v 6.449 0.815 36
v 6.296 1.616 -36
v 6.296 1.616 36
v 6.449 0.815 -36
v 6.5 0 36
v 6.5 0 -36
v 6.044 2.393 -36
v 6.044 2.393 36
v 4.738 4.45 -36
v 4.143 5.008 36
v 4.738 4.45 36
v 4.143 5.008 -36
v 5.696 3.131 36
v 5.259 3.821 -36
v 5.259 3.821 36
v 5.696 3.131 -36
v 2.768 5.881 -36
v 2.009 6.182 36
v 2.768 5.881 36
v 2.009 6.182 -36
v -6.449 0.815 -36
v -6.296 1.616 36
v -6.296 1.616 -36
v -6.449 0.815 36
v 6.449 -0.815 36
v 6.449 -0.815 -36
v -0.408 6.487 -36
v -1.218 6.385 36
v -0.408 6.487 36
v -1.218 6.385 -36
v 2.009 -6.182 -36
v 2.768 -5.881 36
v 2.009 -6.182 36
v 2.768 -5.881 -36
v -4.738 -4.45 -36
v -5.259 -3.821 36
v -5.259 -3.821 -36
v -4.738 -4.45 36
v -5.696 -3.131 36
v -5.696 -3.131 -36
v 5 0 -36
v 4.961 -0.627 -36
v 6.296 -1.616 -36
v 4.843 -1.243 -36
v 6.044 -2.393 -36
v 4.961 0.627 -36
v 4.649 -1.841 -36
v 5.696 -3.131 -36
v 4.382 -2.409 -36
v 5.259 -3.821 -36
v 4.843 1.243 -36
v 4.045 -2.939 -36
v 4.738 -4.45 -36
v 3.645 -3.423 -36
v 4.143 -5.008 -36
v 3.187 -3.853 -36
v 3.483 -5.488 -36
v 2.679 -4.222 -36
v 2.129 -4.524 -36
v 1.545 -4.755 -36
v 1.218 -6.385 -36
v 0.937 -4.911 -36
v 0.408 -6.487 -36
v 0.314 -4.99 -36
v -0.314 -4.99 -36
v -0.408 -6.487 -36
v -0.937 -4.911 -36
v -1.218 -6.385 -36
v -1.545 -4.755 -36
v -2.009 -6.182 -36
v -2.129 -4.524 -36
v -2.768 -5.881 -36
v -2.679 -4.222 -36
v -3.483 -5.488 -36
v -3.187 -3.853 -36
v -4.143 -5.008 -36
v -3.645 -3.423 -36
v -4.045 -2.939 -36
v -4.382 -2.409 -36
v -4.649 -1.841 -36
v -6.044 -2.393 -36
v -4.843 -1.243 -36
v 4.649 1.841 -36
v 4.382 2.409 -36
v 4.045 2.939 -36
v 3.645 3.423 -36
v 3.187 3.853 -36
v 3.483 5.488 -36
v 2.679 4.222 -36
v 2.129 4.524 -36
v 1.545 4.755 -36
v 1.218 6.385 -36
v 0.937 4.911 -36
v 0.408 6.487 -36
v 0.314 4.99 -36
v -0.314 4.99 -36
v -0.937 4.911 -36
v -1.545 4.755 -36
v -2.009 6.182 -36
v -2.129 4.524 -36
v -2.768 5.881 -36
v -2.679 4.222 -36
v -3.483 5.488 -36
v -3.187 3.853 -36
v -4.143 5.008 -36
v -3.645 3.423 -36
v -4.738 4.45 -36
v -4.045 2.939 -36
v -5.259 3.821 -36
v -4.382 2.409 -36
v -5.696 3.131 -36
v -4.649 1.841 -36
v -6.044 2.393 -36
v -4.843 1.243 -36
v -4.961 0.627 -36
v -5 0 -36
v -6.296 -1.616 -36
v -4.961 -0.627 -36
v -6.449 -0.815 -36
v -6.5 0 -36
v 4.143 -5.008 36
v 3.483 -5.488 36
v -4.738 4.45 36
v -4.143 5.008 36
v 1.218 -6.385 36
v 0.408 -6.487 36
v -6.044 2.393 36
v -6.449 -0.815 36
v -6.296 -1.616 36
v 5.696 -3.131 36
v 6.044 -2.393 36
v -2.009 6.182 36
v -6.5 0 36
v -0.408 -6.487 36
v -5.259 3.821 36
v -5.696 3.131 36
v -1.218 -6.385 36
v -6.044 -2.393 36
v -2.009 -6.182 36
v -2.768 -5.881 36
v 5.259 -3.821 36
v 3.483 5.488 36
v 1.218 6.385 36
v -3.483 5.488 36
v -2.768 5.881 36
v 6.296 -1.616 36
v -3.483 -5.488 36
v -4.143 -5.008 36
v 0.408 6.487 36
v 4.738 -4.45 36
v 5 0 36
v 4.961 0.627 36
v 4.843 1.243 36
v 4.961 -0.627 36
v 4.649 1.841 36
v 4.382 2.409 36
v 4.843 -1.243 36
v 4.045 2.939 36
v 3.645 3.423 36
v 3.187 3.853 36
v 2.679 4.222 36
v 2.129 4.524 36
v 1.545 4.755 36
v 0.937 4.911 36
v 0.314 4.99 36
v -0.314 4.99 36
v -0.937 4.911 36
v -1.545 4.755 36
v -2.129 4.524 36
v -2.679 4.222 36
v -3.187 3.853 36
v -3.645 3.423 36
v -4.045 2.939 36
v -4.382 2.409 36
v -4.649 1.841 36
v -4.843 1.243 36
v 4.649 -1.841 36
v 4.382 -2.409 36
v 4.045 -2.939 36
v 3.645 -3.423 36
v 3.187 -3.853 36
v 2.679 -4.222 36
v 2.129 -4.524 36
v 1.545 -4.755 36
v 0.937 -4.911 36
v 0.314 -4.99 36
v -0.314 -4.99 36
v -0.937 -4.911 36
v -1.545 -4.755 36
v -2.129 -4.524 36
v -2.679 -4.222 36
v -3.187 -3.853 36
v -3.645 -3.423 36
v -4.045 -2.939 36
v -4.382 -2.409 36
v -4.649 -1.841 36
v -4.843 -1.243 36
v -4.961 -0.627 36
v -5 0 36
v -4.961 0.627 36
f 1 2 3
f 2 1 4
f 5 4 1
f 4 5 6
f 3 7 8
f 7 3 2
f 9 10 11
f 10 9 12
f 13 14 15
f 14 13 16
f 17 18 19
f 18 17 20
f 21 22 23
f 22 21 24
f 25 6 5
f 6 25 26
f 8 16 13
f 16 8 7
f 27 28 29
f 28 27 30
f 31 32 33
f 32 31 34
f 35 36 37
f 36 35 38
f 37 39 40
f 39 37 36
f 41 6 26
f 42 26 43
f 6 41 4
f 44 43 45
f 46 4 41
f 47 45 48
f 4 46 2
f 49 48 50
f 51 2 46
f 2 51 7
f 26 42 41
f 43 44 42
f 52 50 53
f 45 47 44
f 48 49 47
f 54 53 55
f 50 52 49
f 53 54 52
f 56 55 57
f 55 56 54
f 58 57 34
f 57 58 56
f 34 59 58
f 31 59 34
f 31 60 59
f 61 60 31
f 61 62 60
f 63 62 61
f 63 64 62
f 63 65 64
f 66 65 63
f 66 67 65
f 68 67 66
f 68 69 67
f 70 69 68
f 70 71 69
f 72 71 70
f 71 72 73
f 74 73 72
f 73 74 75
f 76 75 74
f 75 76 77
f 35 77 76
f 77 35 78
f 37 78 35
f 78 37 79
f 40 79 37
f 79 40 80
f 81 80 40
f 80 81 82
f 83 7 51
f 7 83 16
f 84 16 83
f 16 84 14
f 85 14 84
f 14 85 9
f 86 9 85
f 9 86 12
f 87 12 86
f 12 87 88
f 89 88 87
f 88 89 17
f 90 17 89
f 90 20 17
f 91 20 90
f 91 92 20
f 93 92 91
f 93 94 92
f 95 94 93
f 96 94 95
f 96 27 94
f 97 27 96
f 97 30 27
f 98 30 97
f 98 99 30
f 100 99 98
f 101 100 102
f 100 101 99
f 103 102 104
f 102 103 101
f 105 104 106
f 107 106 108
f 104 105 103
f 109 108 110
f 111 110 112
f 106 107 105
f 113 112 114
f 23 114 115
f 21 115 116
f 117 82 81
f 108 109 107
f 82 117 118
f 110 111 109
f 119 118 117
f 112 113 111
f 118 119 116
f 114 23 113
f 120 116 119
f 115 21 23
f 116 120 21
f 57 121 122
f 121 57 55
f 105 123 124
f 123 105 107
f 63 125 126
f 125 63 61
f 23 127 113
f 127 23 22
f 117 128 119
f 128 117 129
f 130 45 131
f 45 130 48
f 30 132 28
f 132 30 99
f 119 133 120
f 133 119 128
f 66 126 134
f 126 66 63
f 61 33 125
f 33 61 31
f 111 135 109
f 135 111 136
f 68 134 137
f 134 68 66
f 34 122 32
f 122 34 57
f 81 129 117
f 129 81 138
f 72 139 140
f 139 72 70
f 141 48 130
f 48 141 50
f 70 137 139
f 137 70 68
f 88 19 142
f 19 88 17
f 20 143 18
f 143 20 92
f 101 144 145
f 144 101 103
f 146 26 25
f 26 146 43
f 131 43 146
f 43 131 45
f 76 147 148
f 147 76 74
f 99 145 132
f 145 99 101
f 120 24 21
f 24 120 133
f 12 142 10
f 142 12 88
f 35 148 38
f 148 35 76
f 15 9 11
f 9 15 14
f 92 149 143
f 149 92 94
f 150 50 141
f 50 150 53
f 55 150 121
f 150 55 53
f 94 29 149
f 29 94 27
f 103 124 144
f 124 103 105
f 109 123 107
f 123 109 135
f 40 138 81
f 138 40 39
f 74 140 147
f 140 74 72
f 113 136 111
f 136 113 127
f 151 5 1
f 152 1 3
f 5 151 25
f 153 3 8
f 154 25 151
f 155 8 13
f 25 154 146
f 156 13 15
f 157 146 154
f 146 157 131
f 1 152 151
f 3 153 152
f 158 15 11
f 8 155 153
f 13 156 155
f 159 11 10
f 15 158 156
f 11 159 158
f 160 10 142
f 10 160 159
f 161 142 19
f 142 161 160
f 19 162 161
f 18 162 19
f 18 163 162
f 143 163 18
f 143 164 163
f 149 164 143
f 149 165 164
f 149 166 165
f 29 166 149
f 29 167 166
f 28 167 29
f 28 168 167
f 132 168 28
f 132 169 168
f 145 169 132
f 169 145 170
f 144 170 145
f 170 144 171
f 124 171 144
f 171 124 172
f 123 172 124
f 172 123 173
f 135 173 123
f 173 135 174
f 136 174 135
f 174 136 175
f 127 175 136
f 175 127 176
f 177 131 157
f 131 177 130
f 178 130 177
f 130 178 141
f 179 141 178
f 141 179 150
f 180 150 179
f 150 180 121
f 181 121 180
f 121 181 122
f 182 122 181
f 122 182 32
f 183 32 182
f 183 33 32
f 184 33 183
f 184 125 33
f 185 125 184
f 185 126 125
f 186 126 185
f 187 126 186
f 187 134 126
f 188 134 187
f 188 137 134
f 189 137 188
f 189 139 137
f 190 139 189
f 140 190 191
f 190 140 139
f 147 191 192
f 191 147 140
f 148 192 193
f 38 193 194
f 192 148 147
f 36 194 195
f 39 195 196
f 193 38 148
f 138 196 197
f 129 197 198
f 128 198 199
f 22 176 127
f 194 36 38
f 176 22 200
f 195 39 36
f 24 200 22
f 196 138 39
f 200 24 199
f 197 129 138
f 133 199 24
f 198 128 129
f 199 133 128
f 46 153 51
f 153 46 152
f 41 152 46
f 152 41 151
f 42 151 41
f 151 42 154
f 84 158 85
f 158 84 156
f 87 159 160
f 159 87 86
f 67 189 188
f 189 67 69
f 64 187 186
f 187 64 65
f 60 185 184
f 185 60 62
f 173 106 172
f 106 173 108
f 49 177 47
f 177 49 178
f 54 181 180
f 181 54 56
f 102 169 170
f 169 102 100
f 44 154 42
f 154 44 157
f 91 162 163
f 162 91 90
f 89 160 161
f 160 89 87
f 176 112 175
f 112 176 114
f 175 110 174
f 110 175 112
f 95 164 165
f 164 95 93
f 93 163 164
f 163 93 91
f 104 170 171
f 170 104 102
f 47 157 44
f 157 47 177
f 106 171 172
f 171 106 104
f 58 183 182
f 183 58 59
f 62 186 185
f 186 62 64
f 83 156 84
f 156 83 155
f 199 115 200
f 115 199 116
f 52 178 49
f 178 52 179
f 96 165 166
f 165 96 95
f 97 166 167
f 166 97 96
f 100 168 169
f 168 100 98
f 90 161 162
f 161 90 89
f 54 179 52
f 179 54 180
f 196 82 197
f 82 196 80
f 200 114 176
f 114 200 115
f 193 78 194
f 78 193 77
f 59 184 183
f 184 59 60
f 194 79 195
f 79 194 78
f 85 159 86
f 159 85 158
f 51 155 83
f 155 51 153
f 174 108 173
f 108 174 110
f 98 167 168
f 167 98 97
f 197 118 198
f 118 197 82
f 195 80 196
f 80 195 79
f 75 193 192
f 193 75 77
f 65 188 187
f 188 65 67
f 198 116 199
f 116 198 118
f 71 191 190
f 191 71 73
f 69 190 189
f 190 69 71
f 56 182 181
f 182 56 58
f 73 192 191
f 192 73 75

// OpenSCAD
$fn = 50;


difference() {
	union() {
		translate(v = [0, 0, -36.0000000000]) {
			cylinder(h = 72, r = 6.5000000000);
		}
	}
	union() {
		translate(v = [0, 0, -100.0000000000]) {
			cylinder(h = 200, r = 5.0000000000);
		}
	}
}
